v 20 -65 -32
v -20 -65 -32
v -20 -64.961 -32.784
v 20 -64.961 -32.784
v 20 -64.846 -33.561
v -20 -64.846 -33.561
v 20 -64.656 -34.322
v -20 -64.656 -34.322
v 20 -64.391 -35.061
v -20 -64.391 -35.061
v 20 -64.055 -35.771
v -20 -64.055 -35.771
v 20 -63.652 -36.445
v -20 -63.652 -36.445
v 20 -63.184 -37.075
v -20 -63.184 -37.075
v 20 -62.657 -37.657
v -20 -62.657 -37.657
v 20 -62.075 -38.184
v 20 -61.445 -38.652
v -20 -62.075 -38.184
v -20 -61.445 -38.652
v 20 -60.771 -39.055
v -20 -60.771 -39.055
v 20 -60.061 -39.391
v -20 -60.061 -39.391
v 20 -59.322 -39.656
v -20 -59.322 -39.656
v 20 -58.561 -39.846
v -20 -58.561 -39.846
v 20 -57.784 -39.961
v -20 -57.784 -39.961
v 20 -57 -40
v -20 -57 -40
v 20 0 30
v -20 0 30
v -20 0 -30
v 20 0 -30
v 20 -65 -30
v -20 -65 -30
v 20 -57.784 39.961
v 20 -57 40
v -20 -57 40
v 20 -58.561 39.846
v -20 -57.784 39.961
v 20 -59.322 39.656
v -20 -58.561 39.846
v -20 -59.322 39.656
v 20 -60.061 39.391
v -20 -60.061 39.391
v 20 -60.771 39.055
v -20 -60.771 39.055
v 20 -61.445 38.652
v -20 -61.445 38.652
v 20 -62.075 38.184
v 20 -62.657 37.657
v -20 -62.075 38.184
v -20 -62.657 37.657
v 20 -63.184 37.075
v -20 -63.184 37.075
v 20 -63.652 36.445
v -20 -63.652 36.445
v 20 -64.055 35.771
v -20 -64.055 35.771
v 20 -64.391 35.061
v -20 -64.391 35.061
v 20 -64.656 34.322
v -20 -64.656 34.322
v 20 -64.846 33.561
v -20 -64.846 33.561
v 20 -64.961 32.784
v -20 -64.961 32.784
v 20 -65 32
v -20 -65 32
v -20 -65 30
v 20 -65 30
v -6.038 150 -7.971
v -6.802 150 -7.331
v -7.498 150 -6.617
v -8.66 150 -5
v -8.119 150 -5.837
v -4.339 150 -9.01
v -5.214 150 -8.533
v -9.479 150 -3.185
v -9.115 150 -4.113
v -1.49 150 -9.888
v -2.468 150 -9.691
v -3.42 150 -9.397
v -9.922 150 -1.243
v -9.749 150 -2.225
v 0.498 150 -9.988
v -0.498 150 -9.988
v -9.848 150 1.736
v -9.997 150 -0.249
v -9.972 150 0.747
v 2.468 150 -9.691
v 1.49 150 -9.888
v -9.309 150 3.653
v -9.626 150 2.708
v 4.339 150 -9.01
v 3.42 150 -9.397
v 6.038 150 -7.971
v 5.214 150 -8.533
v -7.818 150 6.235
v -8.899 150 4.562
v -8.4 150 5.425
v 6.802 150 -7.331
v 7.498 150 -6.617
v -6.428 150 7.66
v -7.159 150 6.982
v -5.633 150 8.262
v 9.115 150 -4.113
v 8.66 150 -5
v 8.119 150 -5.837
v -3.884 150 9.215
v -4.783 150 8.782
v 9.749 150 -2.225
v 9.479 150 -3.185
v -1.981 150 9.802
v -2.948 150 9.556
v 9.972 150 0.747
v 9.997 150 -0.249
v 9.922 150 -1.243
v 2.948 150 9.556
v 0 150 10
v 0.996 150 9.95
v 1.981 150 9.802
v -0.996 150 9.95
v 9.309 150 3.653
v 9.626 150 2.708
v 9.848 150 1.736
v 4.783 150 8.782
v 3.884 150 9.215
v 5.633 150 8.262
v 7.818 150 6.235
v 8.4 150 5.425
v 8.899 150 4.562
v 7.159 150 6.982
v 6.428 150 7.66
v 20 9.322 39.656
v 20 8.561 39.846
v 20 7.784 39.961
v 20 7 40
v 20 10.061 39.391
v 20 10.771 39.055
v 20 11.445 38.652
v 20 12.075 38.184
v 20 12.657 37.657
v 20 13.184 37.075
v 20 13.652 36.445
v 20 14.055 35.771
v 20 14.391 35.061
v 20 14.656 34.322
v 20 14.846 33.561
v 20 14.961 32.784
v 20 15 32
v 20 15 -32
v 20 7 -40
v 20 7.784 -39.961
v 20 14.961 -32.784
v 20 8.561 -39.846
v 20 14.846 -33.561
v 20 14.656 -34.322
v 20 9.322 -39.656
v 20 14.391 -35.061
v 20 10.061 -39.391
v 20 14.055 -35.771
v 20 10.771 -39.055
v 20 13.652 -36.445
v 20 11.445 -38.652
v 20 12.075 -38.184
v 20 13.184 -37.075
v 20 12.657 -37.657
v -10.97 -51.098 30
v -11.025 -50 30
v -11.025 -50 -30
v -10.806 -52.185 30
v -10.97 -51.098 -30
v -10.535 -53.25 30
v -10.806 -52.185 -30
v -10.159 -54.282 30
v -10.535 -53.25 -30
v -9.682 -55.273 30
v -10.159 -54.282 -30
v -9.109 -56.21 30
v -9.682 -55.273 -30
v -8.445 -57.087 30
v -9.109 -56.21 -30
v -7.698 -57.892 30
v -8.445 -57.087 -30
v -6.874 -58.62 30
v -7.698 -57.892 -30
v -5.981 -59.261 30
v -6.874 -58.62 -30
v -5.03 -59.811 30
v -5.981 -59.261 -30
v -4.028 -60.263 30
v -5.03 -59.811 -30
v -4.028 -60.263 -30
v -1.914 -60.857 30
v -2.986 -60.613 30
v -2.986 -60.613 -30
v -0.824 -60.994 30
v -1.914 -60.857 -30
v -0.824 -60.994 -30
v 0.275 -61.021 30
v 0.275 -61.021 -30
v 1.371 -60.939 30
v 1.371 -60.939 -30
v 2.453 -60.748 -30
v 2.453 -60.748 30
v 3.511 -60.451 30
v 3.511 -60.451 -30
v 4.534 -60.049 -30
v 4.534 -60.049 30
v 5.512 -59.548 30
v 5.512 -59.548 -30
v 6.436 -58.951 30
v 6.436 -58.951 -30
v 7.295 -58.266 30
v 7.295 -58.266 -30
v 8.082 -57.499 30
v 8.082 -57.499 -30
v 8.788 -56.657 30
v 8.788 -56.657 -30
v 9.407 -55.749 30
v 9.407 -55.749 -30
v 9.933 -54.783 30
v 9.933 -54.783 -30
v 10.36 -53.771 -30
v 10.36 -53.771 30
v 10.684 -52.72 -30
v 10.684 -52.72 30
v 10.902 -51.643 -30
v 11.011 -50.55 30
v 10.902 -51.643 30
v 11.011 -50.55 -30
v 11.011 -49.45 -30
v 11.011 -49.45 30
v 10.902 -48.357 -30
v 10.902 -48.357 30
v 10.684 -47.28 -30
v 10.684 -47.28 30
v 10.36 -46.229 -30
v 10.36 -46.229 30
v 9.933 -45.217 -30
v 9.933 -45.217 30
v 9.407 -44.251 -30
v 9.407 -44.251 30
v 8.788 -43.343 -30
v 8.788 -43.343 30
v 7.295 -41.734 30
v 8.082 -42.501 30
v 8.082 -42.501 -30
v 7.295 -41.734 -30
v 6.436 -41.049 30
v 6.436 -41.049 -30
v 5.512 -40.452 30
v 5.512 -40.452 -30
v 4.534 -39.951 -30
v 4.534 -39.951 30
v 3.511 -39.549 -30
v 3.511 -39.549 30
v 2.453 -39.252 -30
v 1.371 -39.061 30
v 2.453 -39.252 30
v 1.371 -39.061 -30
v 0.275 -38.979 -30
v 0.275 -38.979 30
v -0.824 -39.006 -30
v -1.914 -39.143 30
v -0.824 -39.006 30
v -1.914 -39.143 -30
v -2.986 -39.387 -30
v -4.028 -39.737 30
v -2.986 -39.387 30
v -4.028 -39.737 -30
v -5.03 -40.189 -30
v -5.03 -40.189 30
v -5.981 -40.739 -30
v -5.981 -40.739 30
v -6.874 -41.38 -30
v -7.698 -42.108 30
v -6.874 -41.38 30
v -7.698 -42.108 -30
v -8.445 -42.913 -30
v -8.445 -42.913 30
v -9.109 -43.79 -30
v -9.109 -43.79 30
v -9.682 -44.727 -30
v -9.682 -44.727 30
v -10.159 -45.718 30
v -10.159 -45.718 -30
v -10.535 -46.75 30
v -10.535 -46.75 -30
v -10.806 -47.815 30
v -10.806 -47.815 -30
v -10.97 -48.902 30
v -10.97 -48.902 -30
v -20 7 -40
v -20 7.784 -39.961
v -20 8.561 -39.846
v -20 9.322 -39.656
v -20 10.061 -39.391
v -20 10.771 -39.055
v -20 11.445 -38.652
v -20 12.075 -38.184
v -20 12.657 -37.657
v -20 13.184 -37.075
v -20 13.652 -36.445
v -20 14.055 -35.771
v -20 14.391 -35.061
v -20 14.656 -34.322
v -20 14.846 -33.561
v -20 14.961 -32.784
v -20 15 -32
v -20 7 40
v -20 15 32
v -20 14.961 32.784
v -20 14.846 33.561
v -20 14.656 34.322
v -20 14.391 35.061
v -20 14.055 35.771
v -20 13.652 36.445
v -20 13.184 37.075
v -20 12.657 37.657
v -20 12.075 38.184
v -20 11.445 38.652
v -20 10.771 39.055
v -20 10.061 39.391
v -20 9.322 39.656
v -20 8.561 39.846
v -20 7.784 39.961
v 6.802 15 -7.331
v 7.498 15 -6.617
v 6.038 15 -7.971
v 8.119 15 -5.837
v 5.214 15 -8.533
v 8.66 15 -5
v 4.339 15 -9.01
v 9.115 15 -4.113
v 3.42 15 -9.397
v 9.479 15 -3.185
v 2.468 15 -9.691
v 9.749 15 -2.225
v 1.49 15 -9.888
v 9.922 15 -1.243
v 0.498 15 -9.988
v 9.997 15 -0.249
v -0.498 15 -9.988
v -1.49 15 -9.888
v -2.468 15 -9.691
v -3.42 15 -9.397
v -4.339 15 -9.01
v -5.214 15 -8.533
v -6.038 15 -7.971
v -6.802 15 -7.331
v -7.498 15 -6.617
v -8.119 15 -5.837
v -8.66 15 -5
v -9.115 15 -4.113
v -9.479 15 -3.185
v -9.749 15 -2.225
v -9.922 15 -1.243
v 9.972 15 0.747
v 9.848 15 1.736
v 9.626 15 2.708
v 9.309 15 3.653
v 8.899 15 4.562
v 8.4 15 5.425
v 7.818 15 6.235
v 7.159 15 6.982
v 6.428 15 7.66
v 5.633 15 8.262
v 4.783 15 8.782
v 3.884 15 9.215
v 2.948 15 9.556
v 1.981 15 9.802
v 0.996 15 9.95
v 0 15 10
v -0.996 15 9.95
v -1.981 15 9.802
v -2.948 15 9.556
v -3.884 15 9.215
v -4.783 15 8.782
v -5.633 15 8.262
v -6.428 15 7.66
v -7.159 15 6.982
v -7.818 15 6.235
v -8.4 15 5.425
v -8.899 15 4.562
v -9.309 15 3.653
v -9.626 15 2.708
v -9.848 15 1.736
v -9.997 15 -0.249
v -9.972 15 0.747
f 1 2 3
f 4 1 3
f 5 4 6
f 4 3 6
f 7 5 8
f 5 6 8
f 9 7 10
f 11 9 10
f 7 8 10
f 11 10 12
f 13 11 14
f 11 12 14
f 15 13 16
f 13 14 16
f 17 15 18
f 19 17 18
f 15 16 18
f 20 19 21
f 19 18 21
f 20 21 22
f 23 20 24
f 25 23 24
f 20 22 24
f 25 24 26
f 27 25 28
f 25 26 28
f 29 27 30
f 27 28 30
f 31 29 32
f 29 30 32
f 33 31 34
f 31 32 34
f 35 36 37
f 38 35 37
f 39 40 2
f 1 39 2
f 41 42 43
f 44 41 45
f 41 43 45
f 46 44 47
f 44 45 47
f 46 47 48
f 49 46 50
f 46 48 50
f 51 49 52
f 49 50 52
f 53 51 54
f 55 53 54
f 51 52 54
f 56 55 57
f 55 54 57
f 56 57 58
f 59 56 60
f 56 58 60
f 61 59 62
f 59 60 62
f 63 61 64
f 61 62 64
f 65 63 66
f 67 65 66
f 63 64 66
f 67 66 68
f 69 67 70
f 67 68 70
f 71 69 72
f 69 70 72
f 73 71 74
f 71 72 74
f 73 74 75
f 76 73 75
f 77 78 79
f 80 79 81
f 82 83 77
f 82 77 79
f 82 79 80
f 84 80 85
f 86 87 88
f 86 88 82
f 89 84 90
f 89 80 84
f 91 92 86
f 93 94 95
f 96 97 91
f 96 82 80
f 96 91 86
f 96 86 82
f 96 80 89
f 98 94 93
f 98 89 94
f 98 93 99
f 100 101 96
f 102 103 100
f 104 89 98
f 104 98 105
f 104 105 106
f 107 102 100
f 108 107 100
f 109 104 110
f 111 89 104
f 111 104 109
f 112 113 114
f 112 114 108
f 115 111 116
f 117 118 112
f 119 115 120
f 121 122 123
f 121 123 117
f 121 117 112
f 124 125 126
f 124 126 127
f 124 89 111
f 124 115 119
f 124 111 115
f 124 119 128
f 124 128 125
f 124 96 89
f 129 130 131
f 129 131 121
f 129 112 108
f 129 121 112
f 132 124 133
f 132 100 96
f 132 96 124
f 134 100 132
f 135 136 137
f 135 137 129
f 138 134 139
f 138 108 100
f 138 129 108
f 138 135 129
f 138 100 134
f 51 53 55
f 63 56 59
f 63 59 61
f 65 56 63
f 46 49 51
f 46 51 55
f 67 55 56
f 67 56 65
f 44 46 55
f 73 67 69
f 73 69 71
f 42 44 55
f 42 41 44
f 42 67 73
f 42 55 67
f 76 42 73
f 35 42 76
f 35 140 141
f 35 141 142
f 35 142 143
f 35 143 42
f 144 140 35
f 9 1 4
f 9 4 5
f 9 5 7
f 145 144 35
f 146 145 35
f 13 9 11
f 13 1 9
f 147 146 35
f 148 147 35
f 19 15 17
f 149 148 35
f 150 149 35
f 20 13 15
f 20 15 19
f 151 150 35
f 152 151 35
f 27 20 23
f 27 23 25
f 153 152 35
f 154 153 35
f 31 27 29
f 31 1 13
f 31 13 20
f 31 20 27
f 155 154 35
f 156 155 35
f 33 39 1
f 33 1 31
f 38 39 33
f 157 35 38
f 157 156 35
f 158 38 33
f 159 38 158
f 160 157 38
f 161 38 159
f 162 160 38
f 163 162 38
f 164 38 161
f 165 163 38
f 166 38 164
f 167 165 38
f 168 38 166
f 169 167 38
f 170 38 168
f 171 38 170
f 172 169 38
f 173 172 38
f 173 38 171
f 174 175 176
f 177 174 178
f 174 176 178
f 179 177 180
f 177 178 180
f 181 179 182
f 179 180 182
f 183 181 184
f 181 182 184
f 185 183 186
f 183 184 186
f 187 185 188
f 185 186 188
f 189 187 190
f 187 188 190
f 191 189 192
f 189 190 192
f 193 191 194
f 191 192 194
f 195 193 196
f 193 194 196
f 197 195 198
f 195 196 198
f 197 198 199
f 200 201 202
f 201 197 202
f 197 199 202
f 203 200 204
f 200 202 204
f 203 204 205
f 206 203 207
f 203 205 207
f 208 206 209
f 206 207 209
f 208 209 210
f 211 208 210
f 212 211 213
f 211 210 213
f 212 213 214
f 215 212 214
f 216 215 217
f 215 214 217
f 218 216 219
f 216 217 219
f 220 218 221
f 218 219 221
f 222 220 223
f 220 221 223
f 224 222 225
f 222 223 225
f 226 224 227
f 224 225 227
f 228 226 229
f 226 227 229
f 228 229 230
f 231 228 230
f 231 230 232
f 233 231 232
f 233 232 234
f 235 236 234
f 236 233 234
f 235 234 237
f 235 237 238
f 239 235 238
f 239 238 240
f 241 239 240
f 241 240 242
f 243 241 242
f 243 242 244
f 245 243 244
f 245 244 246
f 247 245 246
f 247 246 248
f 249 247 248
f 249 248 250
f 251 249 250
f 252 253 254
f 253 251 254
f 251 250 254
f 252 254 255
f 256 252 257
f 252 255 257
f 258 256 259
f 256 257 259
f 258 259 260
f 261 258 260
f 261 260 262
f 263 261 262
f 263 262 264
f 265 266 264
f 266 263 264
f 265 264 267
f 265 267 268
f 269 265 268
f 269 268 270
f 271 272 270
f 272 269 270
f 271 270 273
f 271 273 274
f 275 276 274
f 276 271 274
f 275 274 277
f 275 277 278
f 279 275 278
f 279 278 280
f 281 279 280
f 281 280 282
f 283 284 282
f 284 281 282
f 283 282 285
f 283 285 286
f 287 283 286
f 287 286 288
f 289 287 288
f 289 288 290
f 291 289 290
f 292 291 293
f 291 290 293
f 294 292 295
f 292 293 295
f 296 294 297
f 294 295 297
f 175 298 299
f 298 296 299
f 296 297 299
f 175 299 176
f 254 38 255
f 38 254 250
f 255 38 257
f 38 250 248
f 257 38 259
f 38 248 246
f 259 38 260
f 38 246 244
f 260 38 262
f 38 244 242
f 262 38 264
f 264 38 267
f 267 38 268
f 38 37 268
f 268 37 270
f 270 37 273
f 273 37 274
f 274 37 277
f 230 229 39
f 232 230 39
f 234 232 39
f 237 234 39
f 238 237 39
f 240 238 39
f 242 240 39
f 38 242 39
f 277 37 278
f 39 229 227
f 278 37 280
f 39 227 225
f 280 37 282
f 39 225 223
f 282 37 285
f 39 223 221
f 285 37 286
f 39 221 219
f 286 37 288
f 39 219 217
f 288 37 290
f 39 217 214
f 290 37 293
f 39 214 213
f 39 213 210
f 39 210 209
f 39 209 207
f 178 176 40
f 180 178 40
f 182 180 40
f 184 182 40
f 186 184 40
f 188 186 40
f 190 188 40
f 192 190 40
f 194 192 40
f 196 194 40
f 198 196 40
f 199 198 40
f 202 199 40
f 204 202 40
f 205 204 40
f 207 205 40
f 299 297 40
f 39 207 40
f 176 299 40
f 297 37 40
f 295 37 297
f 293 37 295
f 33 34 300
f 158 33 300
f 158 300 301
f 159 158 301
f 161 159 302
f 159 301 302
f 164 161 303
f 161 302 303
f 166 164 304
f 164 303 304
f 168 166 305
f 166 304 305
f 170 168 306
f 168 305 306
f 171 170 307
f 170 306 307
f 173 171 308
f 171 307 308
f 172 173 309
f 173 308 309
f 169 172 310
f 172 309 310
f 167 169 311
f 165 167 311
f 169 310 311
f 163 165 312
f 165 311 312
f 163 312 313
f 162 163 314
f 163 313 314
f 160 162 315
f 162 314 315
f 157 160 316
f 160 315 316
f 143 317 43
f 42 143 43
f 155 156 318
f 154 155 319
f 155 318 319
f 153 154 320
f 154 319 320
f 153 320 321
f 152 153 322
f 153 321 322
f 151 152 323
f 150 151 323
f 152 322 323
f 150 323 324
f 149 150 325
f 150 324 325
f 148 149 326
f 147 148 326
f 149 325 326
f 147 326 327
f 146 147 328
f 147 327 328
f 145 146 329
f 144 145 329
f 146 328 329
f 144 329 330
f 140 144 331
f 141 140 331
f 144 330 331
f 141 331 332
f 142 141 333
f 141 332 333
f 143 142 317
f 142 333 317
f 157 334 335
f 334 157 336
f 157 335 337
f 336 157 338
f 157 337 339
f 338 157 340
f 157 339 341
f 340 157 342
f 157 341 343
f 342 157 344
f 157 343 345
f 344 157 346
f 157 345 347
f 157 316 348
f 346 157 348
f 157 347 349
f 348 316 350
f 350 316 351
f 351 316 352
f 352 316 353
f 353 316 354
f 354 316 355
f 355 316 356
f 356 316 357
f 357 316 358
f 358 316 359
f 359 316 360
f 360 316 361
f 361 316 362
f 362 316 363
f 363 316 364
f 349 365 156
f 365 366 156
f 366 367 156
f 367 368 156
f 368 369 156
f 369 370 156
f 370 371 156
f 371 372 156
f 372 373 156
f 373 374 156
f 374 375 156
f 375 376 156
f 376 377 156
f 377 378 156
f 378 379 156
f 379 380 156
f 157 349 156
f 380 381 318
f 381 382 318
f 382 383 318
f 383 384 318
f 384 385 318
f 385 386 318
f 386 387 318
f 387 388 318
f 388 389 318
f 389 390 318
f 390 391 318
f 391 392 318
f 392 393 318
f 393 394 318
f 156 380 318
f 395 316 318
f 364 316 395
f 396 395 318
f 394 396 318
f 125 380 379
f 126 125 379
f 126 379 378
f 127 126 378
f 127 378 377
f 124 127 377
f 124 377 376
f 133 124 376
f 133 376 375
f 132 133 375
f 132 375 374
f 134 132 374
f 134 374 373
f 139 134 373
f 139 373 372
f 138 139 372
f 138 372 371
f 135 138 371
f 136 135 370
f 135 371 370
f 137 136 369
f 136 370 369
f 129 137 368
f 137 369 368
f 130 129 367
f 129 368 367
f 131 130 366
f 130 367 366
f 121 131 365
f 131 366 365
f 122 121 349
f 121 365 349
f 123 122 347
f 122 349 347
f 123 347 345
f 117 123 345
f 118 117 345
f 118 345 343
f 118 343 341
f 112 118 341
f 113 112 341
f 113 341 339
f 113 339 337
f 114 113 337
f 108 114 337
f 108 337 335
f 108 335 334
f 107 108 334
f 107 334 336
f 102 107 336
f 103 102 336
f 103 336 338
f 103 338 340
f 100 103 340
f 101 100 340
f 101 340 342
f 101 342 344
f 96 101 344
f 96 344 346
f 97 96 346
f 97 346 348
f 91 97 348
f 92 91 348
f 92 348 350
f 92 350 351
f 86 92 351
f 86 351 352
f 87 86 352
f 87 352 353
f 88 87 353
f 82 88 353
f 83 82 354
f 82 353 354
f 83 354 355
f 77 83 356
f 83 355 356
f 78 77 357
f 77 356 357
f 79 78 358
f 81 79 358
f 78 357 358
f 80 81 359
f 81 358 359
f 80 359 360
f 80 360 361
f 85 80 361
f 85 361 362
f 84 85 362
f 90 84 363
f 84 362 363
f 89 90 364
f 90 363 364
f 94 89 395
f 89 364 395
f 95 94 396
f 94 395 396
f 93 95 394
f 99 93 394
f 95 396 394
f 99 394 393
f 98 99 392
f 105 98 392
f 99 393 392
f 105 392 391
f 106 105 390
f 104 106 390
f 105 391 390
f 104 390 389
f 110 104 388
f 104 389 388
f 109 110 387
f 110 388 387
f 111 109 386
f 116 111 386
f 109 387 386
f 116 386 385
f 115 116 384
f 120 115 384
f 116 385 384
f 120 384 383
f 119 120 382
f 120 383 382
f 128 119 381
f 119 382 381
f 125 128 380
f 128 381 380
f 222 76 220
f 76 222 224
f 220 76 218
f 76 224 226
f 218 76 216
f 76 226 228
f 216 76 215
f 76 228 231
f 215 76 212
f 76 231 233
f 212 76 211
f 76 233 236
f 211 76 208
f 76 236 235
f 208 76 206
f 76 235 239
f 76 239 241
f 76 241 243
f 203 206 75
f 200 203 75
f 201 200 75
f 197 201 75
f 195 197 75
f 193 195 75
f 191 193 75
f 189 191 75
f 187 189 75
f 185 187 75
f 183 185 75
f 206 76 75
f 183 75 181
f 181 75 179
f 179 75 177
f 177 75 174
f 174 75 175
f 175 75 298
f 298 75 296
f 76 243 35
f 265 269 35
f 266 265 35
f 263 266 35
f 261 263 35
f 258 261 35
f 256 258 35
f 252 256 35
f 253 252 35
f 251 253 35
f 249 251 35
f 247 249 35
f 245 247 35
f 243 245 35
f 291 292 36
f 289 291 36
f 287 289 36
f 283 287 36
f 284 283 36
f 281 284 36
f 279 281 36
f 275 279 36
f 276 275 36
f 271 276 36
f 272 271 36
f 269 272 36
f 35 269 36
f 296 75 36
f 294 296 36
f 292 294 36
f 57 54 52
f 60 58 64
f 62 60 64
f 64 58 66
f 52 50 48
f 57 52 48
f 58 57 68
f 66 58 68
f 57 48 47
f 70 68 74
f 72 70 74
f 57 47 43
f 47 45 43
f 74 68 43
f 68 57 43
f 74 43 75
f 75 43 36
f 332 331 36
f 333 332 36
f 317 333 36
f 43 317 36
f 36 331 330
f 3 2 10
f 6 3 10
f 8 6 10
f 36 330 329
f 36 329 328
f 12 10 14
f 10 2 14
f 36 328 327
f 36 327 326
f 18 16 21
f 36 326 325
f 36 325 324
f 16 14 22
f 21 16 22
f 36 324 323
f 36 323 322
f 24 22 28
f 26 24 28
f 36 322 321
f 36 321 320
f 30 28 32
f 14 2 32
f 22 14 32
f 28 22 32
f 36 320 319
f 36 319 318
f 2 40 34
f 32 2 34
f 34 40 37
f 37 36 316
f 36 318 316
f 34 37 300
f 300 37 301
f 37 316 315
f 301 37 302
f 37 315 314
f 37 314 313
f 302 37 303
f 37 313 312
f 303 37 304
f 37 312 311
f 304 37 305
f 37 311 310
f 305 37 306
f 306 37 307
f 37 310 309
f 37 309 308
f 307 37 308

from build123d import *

# Parameters (mm, degrees)
SKETCH_1_R           = 10
EXTRUDE_1_DEPTH      = 150
EXTRUDE_2_DEPTH      = 20
EXTRUDE_2_DEPTH_BACK = 20
EXTRUDE_3_REACH      = 168.733
SKETCH_3_R           = 11.024808504


with BuildPart() as part:
    # 草图1 → 凸台-拉伸1 (new body)
    with BuildSketch(Plane(origin=(0, 0, 0), x_dir=(1, 0, 0), z_dir=(0, 1, 0))):
        Circle(SKETCH_1_R)
    extrude(amount=EXTRUDE_1_DEPTH)

    # 草图2 → 凸台-拉伸2 (add, two sides: drawn at the far end of the back side and taken through both)
    with BuildSketch(Plane(origin=(0, 0, 0), x_dir=(0, 0, -1), z_dir=(1, 0, 0)).offset(-EXTRUDE_2_DEPTH_BACK)):
        with BuildLine():
            Line((-30, -65), (-30, 0))
            Line((-30, 0), (30, 0))
            Line((30, 0), (30, -65))
            Line((30, -65), (32, -65))
            ThreePointArc((32, -65), (37.656854249, -62.656854249), (40, -57))
            Line((40, -57), (40, 7))
            ThreePointArc((40, 7), (37.656854249, 12.656854249), (32, 15))
            Line((32, 15), (-32, 15))
            ThreePointArc((-32, 15), (-37.656854249, 12.656854249), (-40, 7))
            Line((-40, 7), (-40, -57))
            ThreePointArc((-40, -57), (-37.656854249, -62.656854249), (-32, -65))
            Line((-32, -65), (-30, -65))
        make_face()
    extrude(amount=EXTRUDE_2_DEPTH + EXTRUDE_2_DEPTH_BACK)

    # 草图3 → 凸台-拉伸3 (add, up to next)
    with BuildSketch(Plane.XY.offset(-30), mode=Mode.PRIVATE) as extrude_3_sk1:
        with Locations((0, -50)):
            Circle(SKETCH_3_R)
    extrude_3_tool1 = extrude(extrude_3_sk1.sketch, amount=EXTRUDE_3_REACH, mode=Mode.PRIVATE) - part.part
    add(extrude_3_tool1.solids().sort_by_distance((0, -50, -30))[0])


solid = part.part
